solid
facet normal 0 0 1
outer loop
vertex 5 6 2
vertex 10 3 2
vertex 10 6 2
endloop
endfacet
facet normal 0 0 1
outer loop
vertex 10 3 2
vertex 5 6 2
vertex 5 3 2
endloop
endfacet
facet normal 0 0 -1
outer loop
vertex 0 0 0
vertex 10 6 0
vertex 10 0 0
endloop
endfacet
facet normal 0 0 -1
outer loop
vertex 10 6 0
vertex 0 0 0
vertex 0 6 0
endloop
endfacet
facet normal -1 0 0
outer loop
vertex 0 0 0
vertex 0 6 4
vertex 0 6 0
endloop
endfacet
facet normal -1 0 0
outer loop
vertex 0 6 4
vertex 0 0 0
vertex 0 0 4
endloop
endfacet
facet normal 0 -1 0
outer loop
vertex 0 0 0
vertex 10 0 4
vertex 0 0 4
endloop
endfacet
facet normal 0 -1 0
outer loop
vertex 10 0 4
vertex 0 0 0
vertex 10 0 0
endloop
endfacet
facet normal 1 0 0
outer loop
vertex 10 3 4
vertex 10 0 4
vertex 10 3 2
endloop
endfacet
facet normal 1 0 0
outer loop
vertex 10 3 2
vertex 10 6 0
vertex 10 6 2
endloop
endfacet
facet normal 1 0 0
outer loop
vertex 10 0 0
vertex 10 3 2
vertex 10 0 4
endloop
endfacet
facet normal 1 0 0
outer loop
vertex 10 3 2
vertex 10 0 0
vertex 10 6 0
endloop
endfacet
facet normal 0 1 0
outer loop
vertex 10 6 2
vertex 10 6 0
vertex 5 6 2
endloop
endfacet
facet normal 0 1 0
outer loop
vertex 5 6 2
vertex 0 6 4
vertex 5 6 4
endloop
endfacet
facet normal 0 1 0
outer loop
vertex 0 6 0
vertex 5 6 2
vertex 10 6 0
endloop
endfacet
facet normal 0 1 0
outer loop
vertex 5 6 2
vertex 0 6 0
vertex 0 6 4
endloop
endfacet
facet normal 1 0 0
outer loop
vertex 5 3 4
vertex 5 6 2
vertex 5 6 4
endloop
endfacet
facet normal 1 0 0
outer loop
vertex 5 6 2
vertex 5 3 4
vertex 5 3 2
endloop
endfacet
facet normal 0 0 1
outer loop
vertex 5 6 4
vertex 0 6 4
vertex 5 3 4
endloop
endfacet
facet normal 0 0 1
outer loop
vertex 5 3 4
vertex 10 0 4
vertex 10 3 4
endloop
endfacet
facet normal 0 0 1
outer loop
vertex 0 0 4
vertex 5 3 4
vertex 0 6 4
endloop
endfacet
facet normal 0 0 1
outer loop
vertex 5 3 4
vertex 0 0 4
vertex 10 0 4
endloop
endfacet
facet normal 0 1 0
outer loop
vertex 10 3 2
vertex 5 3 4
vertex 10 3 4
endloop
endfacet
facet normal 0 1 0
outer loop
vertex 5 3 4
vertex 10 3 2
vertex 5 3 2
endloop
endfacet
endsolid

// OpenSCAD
translate([2.5, 1.5, 1.0]) color([0.7945829717105759, 0.33253614921965546, 0.8159130965336595]) cube([5, 3, 2], center=true);
translate([7.5, 1.5, 1.0]) color([0.1006075202160962, 0.14635848891230385, 0.6976706401912388]) cube([5, 3, 2], center=true);
translate([2.5, 4.5, 1.0]) color([0.04523406786561235, 0.5738660367891669, 0.9100160146990397]) cube([5, 3, 2], center=true);
translate([7.5, 4.5, 1.0]) color([0.534197968260724, 0.6805891325622565, 0.026696794662205203]) cube([5, 3, 2], center=true);
translate([2.5, 1.5, 3.0]) color([0.6349999099114583, 0.6063384177542189, 0.5759529480315407]) cube([5, 3, 2], center=true);
translate([7.5, 1.5, 3.0]) color([0.3912094093228269, 0.3701399403351875, 0.9805166506472687]) cube([5, 3, 2], center=true);
translate([2.5, 4.5, 3.0]) color([0.036392037611485795, 0.021636509855024078, 0.9610312802396112]) cube([5, 3, 2], center=true);
